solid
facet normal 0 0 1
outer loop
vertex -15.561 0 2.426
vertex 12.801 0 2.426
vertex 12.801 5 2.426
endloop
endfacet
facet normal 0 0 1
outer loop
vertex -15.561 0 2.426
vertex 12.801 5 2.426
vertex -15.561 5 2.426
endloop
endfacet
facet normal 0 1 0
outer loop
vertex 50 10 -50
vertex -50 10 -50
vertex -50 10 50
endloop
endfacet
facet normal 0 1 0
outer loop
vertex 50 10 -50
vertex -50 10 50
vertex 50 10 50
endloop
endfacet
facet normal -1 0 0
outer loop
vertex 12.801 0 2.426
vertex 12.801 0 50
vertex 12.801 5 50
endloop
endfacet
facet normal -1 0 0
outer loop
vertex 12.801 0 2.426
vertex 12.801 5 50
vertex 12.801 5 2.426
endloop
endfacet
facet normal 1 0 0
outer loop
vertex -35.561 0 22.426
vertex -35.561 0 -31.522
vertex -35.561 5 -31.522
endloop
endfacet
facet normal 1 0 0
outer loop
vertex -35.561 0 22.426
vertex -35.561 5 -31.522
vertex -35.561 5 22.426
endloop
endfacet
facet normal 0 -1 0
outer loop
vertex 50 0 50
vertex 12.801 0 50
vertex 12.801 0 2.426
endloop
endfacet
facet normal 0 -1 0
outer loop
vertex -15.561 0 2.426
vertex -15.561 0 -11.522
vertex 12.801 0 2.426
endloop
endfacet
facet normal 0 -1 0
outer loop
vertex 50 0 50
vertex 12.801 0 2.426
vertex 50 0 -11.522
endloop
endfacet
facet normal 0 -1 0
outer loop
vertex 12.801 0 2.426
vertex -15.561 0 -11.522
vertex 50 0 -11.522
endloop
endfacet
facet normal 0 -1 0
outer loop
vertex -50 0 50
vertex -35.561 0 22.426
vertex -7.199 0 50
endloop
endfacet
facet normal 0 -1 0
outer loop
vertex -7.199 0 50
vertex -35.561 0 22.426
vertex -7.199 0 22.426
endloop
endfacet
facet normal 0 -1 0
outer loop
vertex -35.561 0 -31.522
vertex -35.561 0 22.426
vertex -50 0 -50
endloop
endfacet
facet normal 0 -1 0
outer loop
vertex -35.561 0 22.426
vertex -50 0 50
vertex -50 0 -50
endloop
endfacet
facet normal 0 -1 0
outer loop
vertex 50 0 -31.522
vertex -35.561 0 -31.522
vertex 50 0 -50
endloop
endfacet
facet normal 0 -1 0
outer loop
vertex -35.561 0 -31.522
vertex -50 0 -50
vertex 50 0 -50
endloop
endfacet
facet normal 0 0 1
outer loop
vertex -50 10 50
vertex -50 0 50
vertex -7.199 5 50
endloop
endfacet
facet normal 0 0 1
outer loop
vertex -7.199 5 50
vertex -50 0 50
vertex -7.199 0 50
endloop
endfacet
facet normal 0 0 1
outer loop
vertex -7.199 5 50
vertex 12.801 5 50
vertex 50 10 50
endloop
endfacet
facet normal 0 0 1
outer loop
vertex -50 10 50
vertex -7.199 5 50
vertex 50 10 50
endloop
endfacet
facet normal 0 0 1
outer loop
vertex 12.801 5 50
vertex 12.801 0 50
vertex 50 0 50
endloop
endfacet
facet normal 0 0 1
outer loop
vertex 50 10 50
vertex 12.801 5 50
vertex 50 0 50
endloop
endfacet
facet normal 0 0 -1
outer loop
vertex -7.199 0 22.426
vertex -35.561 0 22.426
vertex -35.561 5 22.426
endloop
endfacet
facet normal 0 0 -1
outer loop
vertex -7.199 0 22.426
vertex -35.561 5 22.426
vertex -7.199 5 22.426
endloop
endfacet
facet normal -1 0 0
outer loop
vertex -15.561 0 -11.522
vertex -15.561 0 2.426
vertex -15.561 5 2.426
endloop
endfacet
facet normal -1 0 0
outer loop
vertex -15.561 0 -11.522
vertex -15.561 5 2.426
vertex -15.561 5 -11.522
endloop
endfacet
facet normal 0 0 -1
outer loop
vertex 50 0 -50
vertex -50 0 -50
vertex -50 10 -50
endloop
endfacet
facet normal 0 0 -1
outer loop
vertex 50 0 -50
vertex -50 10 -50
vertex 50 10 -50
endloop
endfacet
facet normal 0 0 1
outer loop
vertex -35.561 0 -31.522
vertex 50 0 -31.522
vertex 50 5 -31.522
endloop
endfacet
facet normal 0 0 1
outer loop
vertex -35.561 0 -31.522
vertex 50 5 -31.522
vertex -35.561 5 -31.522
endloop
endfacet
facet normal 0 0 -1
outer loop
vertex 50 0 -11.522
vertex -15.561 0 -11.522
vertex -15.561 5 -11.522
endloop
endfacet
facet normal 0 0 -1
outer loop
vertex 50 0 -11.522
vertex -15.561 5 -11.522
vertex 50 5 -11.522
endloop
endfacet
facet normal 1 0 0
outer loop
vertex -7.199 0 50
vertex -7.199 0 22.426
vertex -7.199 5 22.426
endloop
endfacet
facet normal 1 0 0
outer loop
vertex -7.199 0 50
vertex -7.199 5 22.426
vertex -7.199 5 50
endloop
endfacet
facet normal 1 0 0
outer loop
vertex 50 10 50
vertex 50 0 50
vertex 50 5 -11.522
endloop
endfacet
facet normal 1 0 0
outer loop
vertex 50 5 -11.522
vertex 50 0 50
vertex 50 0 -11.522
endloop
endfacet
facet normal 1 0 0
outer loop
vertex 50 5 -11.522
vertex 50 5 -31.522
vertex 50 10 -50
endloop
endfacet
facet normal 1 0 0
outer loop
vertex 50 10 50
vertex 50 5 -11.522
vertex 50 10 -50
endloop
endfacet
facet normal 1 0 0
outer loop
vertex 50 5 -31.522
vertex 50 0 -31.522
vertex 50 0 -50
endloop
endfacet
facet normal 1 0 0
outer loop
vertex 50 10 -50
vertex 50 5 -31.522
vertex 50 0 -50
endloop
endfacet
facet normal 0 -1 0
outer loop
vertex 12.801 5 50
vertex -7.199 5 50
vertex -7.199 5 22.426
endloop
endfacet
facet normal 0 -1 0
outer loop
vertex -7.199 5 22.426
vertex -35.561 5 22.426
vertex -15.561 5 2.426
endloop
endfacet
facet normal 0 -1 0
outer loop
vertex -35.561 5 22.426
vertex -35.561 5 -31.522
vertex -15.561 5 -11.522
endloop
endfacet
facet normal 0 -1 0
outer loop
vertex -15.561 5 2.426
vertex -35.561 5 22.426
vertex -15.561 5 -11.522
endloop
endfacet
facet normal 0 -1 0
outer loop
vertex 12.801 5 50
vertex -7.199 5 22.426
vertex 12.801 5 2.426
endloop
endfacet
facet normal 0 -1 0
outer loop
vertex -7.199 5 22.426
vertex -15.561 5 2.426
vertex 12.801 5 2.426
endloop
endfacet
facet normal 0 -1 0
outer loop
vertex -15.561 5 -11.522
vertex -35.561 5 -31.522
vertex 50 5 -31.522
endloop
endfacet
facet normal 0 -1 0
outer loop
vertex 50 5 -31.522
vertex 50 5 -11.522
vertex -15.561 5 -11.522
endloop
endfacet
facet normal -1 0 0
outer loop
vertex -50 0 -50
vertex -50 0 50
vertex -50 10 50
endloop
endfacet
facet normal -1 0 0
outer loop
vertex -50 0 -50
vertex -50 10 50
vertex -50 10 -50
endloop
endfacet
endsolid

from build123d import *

# Parameters (mm, degrees)
SKIZZE1_W                       = 100
SKIZZE1_H                       = 100
AUFSATZ_LINEAR_AUSTRAGEN1_DEPTH = 10
SCHNITT_LINEAR_AUSTRAGEN1_DEPTH = 5


with BuildPart() as part:
    # Skizze1 → Aufsatz-Linear austragen1 (new body)
    with BuildSketch(Plane(origin=(0, 0, 0), x_dir=(1, 0, 0), z_dir=(0, 1, 0))):
        Rectangle(SKIZZE1_W, SKIZZE1_H)
    extrude(amount=AUFSATZ_LINEAR_AUSTRAGEN1_DEPTH)

    # Skizze3 → Schnitt-Linear austragen1 (cut)
    with BuildSketch(Plane(origin=(0, 0, 0), x_dir=(1, 0, 0), z_dir=(0, 1, 0))):
        with BuildLine():
            Line((50, 31.52163249), (-35.561044575, 31.52163249))
            Line((-35.561044575, 31.52163249), (-35.561044575, -22.426016782))
            Line((-35.561044575, -22.426016782), (-7.198956111, -22.426016782))
            Line((-7.198956111, -22.426016782), (-7.198956111, -50))
            ThreePointArc((-7.198956111, -50), (2.801043889, -60), (12.801043889, -50))
            Line((12.801043889, -50), (12.801043889, -2.426016782))
            Line((12.801043889, -2.426016782), (-15.561044575, -2.426016782))
            Line((-15.561044575, -2.426016782), (-15.561044575, 11.52163249))
            Line((-15.561044575, 11.52163249), (50, 11.52163249))
            ThreePointArc((50, 11.52163249), (60, 21.52163249), (50, 31.52163249))
        make_face()
    extrude(amount=SCHNITT_LINEAR_AUSTRAGEN1_DEPTH, mode=Mode.SUBTRACT)


solid = part.part
